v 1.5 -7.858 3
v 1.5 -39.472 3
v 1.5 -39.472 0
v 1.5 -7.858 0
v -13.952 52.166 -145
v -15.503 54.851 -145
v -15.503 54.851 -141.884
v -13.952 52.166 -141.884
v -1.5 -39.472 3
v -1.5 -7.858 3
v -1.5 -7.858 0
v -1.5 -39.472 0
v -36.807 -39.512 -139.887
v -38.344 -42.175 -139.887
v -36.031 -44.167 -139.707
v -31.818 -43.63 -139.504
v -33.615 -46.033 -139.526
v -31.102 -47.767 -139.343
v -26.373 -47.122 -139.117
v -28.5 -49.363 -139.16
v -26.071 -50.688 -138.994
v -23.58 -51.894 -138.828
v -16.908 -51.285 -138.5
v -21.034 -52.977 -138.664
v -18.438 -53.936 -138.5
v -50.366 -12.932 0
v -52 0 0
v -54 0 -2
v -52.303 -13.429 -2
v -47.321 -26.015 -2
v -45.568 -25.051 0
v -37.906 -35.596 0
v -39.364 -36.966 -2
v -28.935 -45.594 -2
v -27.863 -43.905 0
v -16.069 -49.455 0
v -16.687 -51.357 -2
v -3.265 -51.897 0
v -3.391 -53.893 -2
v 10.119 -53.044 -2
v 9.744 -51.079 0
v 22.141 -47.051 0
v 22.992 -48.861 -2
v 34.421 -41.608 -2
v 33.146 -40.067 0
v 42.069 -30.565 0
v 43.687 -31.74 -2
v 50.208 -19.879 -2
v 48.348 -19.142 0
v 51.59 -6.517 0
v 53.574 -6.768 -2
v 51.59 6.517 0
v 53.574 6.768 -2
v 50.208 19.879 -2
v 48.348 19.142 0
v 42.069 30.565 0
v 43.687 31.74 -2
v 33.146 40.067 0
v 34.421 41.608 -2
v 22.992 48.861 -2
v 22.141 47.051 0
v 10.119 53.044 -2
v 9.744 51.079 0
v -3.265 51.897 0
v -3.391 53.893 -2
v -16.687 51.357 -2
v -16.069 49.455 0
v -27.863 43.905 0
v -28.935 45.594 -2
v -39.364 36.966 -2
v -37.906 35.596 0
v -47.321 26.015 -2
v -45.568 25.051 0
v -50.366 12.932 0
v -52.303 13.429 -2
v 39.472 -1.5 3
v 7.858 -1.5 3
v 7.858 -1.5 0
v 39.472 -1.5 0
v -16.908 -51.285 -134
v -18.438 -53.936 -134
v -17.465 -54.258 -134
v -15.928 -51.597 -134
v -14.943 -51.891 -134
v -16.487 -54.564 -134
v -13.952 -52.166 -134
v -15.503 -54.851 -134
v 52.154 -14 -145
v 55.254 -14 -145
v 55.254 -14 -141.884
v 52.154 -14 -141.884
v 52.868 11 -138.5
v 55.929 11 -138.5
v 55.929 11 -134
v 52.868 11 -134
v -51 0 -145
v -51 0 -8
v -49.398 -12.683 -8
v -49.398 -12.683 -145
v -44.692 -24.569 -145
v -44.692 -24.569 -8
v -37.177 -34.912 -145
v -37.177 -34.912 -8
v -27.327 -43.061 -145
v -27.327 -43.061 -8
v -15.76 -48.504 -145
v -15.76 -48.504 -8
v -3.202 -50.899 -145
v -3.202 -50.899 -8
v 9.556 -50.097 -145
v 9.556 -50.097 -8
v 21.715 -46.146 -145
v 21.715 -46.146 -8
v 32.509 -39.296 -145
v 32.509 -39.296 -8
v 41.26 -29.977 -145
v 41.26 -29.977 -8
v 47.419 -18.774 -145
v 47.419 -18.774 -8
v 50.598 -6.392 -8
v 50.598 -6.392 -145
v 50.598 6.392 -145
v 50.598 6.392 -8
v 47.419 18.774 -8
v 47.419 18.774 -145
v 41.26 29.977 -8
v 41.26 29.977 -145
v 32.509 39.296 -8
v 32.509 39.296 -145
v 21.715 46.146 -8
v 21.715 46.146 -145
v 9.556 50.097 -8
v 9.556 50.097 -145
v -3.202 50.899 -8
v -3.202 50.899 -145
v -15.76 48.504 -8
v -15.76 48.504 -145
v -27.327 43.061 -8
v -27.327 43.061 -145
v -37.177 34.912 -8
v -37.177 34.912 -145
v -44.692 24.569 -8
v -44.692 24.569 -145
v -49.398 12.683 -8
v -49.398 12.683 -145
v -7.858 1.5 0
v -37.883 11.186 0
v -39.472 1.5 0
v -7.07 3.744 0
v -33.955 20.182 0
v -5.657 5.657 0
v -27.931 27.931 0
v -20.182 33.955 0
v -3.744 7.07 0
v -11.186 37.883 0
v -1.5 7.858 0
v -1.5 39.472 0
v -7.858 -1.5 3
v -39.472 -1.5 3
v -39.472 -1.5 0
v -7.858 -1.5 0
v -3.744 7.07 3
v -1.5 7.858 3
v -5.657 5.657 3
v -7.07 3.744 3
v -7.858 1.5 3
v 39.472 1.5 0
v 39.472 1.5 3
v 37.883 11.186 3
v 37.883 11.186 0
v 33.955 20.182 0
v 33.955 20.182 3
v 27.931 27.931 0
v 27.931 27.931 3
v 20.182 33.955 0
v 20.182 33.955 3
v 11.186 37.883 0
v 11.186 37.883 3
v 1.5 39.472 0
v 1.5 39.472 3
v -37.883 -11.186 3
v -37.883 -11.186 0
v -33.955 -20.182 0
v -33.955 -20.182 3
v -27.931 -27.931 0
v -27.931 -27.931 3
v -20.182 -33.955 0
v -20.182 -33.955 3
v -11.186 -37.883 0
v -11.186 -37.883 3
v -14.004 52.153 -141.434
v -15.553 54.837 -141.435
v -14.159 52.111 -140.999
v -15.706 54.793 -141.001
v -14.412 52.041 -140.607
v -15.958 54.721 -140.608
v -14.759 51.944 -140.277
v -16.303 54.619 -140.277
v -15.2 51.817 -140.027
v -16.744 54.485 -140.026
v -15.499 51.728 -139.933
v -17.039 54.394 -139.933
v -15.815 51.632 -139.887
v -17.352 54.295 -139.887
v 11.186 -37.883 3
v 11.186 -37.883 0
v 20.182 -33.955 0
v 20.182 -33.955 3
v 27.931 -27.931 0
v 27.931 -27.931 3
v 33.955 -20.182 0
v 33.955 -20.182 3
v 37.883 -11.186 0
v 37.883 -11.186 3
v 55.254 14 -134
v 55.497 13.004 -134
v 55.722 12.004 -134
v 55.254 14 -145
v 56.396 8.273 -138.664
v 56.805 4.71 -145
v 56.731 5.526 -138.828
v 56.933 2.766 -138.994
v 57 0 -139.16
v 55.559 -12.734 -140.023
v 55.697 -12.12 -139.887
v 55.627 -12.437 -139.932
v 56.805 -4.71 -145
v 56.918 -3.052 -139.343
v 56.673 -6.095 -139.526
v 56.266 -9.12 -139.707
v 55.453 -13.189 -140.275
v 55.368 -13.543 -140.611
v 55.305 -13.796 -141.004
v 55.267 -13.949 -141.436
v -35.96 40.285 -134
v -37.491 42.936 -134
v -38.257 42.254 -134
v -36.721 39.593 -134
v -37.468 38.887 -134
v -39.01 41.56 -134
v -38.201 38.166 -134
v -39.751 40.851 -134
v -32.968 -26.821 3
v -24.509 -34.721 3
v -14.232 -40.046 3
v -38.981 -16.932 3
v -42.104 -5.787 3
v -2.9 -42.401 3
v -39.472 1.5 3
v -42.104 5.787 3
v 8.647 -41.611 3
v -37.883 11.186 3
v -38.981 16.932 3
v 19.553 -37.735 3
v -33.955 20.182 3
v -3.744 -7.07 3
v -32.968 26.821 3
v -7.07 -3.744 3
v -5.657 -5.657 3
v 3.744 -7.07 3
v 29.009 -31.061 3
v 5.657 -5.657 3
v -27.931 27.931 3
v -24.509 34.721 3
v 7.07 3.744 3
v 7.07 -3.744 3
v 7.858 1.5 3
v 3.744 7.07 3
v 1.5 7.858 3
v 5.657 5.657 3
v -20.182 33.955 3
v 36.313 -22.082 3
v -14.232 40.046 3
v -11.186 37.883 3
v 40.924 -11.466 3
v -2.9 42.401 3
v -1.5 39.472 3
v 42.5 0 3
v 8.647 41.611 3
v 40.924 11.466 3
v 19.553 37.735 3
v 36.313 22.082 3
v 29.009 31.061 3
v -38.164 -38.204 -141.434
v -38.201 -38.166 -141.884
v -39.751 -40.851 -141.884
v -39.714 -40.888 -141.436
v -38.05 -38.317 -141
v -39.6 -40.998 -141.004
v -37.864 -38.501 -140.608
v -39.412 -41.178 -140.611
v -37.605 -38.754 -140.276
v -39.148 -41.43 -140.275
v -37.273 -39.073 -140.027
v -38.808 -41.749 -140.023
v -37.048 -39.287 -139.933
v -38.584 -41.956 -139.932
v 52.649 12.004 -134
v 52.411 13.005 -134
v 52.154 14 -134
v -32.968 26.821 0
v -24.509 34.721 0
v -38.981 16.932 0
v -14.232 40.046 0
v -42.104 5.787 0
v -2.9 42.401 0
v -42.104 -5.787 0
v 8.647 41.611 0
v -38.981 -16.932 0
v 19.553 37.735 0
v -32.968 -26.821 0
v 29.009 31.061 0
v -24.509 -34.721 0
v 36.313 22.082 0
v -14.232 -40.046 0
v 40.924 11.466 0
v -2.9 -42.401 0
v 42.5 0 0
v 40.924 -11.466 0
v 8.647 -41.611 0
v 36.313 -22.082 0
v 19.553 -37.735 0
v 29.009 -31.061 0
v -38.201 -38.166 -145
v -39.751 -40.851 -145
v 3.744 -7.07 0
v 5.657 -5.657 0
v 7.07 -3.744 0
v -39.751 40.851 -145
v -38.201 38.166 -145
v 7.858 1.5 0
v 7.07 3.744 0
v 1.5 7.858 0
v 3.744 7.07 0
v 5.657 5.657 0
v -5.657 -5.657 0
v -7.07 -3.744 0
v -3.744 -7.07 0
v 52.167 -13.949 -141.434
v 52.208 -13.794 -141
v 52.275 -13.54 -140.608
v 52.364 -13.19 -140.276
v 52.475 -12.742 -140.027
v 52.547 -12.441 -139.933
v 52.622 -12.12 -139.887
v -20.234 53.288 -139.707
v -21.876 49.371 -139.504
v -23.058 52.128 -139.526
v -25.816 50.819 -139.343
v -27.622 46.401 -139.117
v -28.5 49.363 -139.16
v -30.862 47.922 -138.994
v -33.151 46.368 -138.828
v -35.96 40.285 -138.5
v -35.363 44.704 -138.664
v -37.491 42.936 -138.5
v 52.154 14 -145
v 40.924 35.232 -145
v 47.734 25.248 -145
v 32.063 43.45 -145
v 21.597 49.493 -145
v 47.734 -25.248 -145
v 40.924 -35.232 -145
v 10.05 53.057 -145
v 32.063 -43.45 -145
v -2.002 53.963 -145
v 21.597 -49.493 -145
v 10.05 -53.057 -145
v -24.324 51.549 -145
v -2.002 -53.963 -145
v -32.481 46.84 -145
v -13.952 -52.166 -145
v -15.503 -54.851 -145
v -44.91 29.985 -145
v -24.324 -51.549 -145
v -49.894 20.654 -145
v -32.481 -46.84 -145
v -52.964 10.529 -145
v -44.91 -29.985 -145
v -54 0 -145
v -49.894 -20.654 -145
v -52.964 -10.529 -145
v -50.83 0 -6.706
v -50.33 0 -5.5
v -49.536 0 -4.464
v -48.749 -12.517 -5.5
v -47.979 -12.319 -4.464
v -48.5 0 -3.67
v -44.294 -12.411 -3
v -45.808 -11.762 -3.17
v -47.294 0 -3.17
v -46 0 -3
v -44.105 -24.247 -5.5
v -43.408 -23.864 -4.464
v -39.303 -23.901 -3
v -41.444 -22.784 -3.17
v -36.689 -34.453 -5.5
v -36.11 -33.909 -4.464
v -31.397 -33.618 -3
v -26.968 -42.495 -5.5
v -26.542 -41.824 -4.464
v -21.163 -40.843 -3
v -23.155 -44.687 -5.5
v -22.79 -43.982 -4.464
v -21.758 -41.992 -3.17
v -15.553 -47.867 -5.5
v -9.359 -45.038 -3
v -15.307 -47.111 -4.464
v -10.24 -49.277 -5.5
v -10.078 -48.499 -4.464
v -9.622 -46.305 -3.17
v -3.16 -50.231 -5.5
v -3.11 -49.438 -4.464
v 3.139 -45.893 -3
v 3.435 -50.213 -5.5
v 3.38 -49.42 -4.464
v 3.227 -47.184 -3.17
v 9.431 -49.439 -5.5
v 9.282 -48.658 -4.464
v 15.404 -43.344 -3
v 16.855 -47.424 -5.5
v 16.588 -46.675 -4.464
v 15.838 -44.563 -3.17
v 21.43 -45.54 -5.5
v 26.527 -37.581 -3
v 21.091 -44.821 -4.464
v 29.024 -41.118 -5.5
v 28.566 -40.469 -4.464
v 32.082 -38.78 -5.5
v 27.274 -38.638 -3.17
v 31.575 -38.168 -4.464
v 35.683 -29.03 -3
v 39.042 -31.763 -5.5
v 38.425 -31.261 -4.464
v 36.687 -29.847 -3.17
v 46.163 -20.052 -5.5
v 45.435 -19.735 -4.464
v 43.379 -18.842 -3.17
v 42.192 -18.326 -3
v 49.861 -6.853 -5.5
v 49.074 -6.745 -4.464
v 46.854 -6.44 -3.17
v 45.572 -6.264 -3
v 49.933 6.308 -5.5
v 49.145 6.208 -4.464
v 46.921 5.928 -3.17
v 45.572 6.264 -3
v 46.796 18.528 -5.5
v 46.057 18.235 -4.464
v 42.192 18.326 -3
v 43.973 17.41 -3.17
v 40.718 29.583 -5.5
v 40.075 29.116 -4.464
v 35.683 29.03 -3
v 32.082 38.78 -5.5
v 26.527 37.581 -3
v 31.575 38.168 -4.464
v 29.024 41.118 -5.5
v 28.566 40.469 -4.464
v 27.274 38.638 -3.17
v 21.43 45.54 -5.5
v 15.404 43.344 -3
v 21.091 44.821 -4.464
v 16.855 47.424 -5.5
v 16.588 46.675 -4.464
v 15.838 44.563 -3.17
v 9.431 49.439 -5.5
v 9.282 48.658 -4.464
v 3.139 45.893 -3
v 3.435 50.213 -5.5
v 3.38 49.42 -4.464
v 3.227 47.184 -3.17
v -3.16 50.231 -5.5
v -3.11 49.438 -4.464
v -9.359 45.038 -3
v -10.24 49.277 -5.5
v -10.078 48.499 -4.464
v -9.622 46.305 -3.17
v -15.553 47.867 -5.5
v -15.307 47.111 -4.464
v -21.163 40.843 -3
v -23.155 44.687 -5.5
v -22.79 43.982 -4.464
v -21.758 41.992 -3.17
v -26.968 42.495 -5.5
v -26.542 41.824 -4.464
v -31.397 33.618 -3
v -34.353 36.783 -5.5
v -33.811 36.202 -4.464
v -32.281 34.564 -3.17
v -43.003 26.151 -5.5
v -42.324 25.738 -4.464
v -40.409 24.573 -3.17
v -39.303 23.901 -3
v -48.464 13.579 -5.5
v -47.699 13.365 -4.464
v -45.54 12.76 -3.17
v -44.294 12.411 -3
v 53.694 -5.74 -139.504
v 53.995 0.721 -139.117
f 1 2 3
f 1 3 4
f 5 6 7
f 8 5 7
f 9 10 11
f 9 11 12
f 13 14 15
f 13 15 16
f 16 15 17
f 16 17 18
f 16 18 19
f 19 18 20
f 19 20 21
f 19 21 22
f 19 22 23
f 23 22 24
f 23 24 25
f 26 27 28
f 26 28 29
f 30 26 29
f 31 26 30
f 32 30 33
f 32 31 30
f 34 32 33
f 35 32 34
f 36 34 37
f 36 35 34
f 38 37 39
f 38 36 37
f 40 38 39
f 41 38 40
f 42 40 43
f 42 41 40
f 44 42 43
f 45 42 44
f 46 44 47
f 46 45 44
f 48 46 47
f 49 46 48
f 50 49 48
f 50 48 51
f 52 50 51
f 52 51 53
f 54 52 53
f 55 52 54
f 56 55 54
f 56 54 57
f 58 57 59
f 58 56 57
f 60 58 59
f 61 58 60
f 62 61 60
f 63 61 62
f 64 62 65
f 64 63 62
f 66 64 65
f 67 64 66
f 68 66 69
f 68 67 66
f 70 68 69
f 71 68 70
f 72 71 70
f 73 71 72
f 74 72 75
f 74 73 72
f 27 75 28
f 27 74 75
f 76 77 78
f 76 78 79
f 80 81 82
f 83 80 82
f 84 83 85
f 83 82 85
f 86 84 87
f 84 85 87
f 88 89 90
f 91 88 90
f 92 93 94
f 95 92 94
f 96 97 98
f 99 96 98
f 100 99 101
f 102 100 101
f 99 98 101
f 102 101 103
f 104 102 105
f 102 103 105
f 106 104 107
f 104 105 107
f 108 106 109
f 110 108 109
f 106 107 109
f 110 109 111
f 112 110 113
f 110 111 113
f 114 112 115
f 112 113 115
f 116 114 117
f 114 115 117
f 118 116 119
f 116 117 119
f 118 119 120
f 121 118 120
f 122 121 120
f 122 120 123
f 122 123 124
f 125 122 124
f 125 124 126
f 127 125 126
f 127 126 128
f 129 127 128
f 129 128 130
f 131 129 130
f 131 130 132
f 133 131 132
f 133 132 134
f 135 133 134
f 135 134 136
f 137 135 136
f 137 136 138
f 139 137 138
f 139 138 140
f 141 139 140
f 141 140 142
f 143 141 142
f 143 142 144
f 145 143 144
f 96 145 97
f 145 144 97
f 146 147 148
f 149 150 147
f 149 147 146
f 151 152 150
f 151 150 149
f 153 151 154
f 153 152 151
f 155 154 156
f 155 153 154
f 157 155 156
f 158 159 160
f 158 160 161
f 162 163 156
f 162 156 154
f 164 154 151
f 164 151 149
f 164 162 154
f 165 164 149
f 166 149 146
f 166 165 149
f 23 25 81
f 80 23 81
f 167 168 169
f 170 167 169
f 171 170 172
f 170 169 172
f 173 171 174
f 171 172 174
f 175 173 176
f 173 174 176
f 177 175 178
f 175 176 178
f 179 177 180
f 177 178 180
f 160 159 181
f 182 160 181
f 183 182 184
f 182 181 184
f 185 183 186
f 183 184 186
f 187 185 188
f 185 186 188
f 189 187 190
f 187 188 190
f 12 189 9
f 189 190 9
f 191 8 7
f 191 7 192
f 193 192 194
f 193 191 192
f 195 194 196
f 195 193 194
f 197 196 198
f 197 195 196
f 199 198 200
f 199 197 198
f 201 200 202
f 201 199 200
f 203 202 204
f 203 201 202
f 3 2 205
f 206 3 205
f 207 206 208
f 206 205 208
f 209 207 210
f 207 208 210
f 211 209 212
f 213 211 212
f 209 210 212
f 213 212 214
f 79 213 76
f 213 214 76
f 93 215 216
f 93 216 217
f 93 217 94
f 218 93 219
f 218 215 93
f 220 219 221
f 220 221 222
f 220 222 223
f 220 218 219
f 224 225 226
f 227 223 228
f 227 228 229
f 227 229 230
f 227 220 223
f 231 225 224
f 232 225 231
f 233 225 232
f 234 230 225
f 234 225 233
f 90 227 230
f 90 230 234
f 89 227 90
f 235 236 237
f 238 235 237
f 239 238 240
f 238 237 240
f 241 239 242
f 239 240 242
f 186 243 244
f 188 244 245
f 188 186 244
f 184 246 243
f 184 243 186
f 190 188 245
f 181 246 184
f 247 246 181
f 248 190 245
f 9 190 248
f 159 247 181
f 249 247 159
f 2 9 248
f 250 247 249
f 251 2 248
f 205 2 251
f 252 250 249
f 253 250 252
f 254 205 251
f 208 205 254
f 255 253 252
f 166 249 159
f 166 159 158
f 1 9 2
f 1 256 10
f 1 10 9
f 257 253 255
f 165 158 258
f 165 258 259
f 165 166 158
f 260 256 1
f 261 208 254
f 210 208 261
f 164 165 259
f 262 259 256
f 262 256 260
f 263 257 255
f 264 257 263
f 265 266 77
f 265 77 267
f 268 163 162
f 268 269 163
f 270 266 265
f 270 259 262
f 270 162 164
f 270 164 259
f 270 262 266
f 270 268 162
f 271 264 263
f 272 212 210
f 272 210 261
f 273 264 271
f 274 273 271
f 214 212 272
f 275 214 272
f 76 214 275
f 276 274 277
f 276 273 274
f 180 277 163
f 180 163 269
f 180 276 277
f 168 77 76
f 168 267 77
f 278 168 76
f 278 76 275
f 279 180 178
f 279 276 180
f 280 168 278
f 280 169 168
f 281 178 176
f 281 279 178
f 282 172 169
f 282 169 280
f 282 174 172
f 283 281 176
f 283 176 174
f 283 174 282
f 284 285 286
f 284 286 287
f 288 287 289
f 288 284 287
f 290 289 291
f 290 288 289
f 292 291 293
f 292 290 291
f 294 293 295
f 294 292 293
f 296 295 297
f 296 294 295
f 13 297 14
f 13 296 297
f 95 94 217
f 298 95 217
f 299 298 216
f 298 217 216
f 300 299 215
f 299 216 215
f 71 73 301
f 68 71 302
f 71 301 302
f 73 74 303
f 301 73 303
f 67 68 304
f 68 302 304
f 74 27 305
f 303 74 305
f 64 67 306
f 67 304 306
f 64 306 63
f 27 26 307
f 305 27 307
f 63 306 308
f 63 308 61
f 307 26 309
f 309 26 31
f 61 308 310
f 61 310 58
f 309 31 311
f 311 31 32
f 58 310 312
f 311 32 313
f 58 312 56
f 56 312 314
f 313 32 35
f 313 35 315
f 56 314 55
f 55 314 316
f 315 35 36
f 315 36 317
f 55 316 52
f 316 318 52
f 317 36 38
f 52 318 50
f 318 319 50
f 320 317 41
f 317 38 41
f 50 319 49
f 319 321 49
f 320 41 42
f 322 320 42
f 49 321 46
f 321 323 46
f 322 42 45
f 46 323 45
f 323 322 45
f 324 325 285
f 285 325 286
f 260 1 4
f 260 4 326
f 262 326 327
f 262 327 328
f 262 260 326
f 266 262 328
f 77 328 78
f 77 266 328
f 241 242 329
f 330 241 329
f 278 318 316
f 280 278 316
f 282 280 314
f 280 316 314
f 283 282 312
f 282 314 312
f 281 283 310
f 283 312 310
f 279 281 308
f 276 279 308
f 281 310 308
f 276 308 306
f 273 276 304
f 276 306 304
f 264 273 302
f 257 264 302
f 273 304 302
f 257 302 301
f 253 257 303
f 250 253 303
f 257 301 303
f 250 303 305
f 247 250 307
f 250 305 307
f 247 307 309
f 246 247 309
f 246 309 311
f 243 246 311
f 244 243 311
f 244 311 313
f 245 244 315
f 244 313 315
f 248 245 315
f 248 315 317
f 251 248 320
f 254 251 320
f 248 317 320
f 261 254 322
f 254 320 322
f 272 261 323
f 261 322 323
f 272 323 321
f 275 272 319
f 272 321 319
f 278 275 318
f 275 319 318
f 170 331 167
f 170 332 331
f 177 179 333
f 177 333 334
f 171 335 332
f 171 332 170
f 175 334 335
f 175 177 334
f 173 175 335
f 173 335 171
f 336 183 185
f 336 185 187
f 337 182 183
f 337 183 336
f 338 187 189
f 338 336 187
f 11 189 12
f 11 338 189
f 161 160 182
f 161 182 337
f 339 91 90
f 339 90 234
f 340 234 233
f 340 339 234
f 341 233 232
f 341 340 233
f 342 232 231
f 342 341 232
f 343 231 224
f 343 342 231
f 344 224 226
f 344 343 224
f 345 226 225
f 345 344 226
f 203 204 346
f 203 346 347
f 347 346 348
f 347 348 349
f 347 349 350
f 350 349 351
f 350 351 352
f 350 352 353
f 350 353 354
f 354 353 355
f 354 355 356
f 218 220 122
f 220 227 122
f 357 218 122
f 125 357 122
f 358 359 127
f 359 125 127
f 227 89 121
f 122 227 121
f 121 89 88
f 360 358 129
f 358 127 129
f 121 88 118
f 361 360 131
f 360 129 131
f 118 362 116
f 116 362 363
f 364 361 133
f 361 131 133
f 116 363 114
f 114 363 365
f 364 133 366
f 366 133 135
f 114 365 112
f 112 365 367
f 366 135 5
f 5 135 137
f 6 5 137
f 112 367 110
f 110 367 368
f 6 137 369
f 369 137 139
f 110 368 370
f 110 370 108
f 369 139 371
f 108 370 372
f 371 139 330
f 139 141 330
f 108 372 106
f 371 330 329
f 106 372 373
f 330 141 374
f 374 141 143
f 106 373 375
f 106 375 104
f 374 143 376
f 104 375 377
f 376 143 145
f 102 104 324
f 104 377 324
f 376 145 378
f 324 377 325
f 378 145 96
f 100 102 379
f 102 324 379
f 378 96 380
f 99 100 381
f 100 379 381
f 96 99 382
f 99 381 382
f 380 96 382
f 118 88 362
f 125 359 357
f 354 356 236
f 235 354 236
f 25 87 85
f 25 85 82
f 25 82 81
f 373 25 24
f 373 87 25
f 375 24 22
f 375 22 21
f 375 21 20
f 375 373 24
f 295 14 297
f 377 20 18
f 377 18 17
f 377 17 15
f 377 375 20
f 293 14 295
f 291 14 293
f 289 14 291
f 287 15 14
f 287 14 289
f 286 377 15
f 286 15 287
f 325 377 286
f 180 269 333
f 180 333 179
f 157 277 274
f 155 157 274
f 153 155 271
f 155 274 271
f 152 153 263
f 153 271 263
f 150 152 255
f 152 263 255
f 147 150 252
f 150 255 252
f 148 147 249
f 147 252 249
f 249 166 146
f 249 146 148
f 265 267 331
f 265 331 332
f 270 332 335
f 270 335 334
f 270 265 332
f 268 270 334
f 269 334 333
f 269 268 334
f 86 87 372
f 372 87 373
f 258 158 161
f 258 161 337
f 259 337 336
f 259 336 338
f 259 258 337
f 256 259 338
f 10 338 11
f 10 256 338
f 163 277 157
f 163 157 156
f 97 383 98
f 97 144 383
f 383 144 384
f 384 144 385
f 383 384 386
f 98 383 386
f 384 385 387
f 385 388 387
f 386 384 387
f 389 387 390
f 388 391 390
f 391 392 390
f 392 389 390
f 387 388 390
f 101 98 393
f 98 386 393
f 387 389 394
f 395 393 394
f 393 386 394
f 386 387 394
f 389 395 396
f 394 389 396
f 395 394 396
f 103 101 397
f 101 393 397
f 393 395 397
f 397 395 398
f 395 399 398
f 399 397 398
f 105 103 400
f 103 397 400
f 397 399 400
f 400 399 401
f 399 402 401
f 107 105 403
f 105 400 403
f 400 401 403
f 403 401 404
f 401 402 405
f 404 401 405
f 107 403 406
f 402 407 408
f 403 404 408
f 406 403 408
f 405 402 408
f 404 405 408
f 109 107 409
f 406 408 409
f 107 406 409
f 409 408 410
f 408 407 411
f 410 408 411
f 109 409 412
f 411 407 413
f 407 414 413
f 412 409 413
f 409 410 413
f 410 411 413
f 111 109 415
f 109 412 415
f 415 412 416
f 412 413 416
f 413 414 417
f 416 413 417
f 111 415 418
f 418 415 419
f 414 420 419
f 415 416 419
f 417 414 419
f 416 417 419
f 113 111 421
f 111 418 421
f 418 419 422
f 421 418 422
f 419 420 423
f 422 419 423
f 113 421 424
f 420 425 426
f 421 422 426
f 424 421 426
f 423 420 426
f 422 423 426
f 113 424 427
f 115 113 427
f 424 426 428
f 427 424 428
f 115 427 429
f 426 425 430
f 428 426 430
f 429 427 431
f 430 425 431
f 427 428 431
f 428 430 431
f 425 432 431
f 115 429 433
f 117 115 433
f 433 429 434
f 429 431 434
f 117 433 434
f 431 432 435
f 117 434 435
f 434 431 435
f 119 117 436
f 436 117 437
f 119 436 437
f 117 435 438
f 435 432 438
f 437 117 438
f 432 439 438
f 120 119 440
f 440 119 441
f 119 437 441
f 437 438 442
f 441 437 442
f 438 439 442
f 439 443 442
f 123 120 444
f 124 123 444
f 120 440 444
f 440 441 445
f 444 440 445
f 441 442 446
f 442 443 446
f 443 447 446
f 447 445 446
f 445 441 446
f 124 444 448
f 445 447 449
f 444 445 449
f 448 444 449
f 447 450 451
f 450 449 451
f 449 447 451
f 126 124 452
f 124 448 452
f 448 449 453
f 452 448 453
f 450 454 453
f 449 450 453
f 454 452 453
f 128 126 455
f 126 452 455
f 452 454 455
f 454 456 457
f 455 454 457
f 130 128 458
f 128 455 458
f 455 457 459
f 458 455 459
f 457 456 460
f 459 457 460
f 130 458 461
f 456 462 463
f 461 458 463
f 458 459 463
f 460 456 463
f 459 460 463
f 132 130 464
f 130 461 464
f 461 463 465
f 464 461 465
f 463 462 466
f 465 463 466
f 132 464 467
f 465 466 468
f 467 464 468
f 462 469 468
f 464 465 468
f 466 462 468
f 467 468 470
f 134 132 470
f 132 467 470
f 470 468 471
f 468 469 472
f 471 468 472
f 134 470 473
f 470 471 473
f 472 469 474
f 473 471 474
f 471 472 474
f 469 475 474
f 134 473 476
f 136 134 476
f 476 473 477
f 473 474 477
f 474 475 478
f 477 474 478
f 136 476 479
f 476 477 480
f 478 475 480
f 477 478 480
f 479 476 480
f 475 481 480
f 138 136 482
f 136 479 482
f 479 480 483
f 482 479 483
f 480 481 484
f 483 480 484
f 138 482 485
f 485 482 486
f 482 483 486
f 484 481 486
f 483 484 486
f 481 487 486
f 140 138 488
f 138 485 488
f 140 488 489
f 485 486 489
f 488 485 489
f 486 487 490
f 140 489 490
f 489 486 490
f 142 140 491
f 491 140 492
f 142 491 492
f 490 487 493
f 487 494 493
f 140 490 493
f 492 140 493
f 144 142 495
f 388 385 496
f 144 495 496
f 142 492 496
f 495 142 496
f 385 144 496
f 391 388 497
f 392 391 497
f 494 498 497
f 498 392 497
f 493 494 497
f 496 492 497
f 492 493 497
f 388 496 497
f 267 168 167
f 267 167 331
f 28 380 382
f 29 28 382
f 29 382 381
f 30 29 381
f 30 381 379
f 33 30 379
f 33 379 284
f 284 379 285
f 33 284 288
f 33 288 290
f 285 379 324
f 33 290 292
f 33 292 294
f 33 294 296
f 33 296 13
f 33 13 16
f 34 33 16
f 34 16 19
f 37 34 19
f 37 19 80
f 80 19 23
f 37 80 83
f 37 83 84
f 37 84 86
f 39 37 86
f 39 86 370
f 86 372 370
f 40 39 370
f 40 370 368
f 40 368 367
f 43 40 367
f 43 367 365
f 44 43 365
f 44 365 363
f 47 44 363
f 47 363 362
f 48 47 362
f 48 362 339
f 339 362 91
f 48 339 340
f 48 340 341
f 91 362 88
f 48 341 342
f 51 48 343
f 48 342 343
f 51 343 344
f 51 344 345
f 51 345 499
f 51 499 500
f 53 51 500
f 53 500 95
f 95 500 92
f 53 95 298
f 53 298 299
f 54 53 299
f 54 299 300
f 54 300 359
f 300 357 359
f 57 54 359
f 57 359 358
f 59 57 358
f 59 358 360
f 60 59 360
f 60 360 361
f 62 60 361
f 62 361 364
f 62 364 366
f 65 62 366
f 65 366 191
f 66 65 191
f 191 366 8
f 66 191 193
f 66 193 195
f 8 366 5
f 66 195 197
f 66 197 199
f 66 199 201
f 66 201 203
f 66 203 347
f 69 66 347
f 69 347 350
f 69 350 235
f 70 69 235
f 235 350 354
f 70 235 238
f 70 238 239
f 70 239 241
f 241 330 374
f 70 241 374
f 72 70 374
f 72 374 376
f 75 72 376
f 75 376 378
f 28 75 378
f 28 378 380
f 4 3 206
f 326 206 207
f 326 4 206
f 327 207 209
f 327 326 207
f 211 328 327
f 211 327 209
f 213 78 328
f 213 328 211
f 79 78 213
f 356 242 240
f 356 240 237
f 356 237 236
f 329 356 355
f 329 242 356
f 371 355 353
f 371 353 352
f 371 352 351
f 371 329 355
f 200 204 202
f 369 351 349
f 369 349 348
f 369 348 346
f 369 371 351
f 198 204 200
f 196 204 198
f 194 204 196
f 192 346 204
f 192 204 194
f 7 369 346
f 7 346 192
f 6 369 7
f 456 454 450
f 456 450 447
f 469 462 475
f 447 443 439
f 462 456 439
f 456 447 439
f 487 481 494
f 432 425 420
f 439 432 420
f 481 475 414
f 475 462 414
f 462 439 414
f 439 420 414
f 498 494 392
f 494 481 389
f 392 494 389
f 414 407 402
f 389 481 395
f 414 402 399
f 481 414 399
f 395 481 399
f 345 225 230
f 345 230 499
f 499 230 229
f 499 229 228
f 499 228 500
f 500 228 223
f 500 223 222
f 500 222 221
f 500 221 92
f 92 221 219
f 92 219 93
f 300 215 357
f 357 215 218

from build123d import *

# Parameters (mm, degrees)
EXTRUDE_1_DEPTH                  = 10
FILLET_1_R                       = 2
PATTERN_CIRCULAR_2_COUNT         = 3
FILLET_1_OF_PATTERN_CIRCULAR_2_R = 2
CUT_EXTRUDE_START                = -15
SKETCH_3_R                       = 51
CUT_EXTRUDE_1_DEPTH              = 15
SKETCH_4_R                       = 62.618720145
SKETCH_4_R_2                     = 57
CUT_EXTRUDE_2_DEPTH              = 15
CHAMFER_1_SIZE                   = 2
FILLET_2_R                       = 5
SKETCH_5_R                       = 42.5
EXTRUDE_2_DEPTH                  = 3
SKETCH_7_R                       = 39.5
CUT_EXTRUDE_3_DEPTH              = 3
EXTRUDE_START                    = 3
SKETCH_8_W                       = 3
SKETCH_8_H                       = 3
EXTRUDE_4_DEPTH                  = 3


with BuildPart() as part:
    # Эскиз1 → Повернуть1 (revolve)
    with BuildSketch(Plane(origin=(0, 0, 0), x_dir=(1, 0, 0), z_dir=(0, 1, 0))):
        Polygon((0, 0), (-54, 0), (-54, 145), (-51, 145), (-51, 3), (0, 3), align=None)
    revolve(axis=Axis((0, 0, -3), (0, 0, 1)))

    # Эскиз2 → Бобышка-Вытянуть1 (add)
    with BuildSketch(Plane(origin=(57, 0, 0), x_dir=(0, 0, -1), z_dir=(1, 0, 0))):
        Polygon((145, 14), (145, -14), (140, -14), (138.5, 11), (134, 11), (134, 14), align=None)
    extrude_1 = extrude(amount=-EXTRUDE_1_DEPTH)

    # Скругление1
    fillet_1_edges = [part.edges().sort_by_distance(p)[0] for p in [
        (54.576809621, -14, -140),
    ]]
    fillet(fillet_1_edges, radius=FILLET_1_R)

    # Круговой массив2: Бобышка-Вытянуть1 ×3 about axis
    pattern_circular_2_axis = Axis((0, 0, 0), (0, 0, 1))
    for i in range(1, PATTERN_CIRCULAR_2_COUNT):
        add(extrude_1.rotate(pattern_circular_2_axis, i * 360 / PATTERN_CIRCULAR_2_COUNT))

    # Скругление1 of Круговой массив2
    fillet_1_of_pattern_circular_2_edges = [part.edges().sort_by_distance(p)[0] for p in [
        (-15.164049157, 54.264903589, -140),
        (-39.412760463, -40.264903589, -140),
    ]]
    fillet(fillet_1_of_pattern_circular_2_edges, radius=FILLET_1_OF_PATTERN_CIRCULAR_2_R)

    # Эскиз3 → Вырез-Вытянуть1 (cut)
    with BuildSketch(Plane(origin=(0, 0, -145), x_dir=(-1, 0, 0), z_dir=(0, 0, -1)).offset(CUT_EXTRUDE_START)):
        Circle(SKETCH_3_R)
    extrude(amount=CUT_EXTRUDE_1_DEPTH, mode=Mode.SUBTRACT)

    # Эскиз4 → Вырез-Вытянуть2 (cut)
    with BuildSketch(Plane(origin=(0, 0, -145), x_dir=(-1, 0, 0), z_dir=(0, 0, -1))):
        Circle(SKETCH_4_R)
        Circle(SKETCH_4_R_2, mode=Mode.SUBTRACT)
    extrude(amount=-CUT_EXTRUDE_2_DEPTH, mode=Mode.SUBTRACT)

    # Фаска1
    chamfer_1_edges = [part.edges().sort_by_distance(p)[0] for p in [
        (54, 0, 0),
    ]]
    chamfer(chamfer_1_edges, length=CHAMFER_1_SIZE)

    # Скругление2
    fillet_2_edges = [part.edges().sort_by_distance(p)[0] for p in [
        (51, 0, -3),
    ]]
    fillet(fillet_2_edges, radius=FILLET_2_R)

    # Эскиз5 → Бобышка-Вытянуть2 (add)
    with BuildSketch(Plane.XY):
        Circle(SKETCH_5_R)
    extrude(amount=EXTRUDE_2_DEPTH)

    # Эскиз7 → Вырез-Вытянуть3 (cut)
    with BuildSketch(Plane.XY.offset(3)):
        Circle(SKETCH_7_R)
    extrude(amount=-CUT_EXTRUDE_3_DEPTH, mode=Mode.SUBTRACT)

    # Эскиз8 → Бобышка-Вытянуть4 (add)
    with BuildSketch(Plane.XY.offset(EXTRUDE_START)):
        with BuildLine():
            Line((-1.5, -7.858116823), (-1.5, -39.471508712))
            ThreePointArc((-1.5, -39.471508712), (0, -39.5), (1.5, -39.471508712))
            Line((1.5, -39.471508712), (1.5, -7.858116823))
            ThreePointArc((1.5, -7.858116823), (0, -8), (-1.5, -7.858116823))
        make_face()
        with BuildLine():
            ThreePointArc((1.5, 39.471508712), (0, 39.5), (-1.5, 39.471508712))
            Line((-1.5, 39.471508712), (-1.5, 7.858116823))
            ThreePointArc((-1.5, 7.858116823), (0, 8), (1.5, 7.858116823))
            Line((1.5, 7.858116823), (1.5, 39.471508712))
        make_face()
        with BuildLine():
            Line((-1.5, 7.858116823), (-1.5, 1.5))
            Line((-1.5, 1.5), (1.5, 1.5))
            Line((1.5, 1.5), (1.5, 7.858116823))
            ThreePointArc((1.5, 7.858116823), (0, 8), (-1.5, 7.858116823))
        make_face()
        with BuildLine():
            Line((1.5, 7.858116823), (1.5, 1.5))
            Line((1.5, 1.5), (7.858116823, 1.5))
            ThreePointArc((7.858116823, 1.5), (5.656854249, 5.656854249), (1.5, 7.858116823))
        make_face()
        with BuildLine():
            Line((1.5, 1.5), (1.5, -1.5))
            Line((1.5, -1.5), (7.858116823, -1.5))
            ThreePointArc((7.858116823, -1.5), (7.964450219, -0.753347668), (8, 0))
            ThreePointArc((8, 0), (7.964450219, 0.753347668), (7.858116823, 1.5))
            Line((7.858116823, 1.5), (1.5, 1.5))
        make_face()
        with BuildLine():
            ThreePointArc((-39.471508712, 1.5), (-39.5, 0), (-39.471508712, -1.5))
            Line((-39.471508712, -1.5), (-7.858116823, -1.5))
            ThreePointArc((-7.858116823, -1.5), (-8, 0), (-7.858116823, 1.5))
            Line((-7.858116823, 1.5), (-39.471508712, 1.5))
        make_face()
        with BuildLine():
            Line((7.858116823, -1.5), (39.471508712, -1.5))
            ThreePointArc((39.471508712, -1.5), (39.492876536, -0.75013528), (39.5, 0))
            ThreePointArc((39.5, 0), (39.492876536, 0.75013528), (39.471508712, 1.5))
            Line((39.471508712, 1.5), (7.858116823, 1.5))
            ThreePointArc((7.858116823, 1.5), (7.964450219, 0.753347668), (8, 0))
            ThreePointArc((8, 0), (7.964450219, -0.753347668), (7.858116823, -1.5))
        make_face()
        with BuildLine():
            Line((1.5, -1.5), (1.5, -7.858116823))
            ThreePointArc((1.5, -7.858116823), (5.656854249, -5.656854249), (7.858116823, -1.5))
            Line((7.858116823, -1.5), (1.5, -1.5))
        make_face()
        with BuildLine():
            Line((-1.5, -1.5), (-1.5, -7.858116823))
            ThreePointArc((-1.5, -7.858116823), (0, -8), (1.5, -7.858116823))
            Line((1.5, -7.858116823), (1.5, -1.5))
            Line((1.5, -1.5), (-1.5, -1.5))
        make_face()
        Rectangle(SKETCH_8_W, SKETCH_8_H)
        with BuildLine():
            Line((-7.858116823, 1.5), (-1.5, 1.5))
            Line((-1.5, 1.5), (-1.5, 7.858116823))
            ThreePointArc((-1.5, 7.858116823), (-5.656854249, 5.656854249), (-7.858116823, 1.5))
        make_face()
        with BuildLine():
            Line((-7.858116823, -1.5), (-1.5, -1.5))
            Line((-1.5, -1.5), (-1.5, 1.5))
            Line((-1.5, 1.5), (-7.858116823, 1.5))
            ThreePointArc((-7.858116823, 1.5), (-8, 0), (-7.858116823, -1.5))
        make_face()
        with BuildLine():
            ThreePointArc((-7.858116823, -1.5), (-5.656854249, -5.656854249), (-1.5, -7.858116823))
            Line((-1.5, -7.858116823), (-1.5, -1.5))
            Line((-1.5, -1.5), (-7.858116823, -1.5))
        make_face()
    extrude(amount=-EXTRUDE_4_DEPTH)


solid = part.part
